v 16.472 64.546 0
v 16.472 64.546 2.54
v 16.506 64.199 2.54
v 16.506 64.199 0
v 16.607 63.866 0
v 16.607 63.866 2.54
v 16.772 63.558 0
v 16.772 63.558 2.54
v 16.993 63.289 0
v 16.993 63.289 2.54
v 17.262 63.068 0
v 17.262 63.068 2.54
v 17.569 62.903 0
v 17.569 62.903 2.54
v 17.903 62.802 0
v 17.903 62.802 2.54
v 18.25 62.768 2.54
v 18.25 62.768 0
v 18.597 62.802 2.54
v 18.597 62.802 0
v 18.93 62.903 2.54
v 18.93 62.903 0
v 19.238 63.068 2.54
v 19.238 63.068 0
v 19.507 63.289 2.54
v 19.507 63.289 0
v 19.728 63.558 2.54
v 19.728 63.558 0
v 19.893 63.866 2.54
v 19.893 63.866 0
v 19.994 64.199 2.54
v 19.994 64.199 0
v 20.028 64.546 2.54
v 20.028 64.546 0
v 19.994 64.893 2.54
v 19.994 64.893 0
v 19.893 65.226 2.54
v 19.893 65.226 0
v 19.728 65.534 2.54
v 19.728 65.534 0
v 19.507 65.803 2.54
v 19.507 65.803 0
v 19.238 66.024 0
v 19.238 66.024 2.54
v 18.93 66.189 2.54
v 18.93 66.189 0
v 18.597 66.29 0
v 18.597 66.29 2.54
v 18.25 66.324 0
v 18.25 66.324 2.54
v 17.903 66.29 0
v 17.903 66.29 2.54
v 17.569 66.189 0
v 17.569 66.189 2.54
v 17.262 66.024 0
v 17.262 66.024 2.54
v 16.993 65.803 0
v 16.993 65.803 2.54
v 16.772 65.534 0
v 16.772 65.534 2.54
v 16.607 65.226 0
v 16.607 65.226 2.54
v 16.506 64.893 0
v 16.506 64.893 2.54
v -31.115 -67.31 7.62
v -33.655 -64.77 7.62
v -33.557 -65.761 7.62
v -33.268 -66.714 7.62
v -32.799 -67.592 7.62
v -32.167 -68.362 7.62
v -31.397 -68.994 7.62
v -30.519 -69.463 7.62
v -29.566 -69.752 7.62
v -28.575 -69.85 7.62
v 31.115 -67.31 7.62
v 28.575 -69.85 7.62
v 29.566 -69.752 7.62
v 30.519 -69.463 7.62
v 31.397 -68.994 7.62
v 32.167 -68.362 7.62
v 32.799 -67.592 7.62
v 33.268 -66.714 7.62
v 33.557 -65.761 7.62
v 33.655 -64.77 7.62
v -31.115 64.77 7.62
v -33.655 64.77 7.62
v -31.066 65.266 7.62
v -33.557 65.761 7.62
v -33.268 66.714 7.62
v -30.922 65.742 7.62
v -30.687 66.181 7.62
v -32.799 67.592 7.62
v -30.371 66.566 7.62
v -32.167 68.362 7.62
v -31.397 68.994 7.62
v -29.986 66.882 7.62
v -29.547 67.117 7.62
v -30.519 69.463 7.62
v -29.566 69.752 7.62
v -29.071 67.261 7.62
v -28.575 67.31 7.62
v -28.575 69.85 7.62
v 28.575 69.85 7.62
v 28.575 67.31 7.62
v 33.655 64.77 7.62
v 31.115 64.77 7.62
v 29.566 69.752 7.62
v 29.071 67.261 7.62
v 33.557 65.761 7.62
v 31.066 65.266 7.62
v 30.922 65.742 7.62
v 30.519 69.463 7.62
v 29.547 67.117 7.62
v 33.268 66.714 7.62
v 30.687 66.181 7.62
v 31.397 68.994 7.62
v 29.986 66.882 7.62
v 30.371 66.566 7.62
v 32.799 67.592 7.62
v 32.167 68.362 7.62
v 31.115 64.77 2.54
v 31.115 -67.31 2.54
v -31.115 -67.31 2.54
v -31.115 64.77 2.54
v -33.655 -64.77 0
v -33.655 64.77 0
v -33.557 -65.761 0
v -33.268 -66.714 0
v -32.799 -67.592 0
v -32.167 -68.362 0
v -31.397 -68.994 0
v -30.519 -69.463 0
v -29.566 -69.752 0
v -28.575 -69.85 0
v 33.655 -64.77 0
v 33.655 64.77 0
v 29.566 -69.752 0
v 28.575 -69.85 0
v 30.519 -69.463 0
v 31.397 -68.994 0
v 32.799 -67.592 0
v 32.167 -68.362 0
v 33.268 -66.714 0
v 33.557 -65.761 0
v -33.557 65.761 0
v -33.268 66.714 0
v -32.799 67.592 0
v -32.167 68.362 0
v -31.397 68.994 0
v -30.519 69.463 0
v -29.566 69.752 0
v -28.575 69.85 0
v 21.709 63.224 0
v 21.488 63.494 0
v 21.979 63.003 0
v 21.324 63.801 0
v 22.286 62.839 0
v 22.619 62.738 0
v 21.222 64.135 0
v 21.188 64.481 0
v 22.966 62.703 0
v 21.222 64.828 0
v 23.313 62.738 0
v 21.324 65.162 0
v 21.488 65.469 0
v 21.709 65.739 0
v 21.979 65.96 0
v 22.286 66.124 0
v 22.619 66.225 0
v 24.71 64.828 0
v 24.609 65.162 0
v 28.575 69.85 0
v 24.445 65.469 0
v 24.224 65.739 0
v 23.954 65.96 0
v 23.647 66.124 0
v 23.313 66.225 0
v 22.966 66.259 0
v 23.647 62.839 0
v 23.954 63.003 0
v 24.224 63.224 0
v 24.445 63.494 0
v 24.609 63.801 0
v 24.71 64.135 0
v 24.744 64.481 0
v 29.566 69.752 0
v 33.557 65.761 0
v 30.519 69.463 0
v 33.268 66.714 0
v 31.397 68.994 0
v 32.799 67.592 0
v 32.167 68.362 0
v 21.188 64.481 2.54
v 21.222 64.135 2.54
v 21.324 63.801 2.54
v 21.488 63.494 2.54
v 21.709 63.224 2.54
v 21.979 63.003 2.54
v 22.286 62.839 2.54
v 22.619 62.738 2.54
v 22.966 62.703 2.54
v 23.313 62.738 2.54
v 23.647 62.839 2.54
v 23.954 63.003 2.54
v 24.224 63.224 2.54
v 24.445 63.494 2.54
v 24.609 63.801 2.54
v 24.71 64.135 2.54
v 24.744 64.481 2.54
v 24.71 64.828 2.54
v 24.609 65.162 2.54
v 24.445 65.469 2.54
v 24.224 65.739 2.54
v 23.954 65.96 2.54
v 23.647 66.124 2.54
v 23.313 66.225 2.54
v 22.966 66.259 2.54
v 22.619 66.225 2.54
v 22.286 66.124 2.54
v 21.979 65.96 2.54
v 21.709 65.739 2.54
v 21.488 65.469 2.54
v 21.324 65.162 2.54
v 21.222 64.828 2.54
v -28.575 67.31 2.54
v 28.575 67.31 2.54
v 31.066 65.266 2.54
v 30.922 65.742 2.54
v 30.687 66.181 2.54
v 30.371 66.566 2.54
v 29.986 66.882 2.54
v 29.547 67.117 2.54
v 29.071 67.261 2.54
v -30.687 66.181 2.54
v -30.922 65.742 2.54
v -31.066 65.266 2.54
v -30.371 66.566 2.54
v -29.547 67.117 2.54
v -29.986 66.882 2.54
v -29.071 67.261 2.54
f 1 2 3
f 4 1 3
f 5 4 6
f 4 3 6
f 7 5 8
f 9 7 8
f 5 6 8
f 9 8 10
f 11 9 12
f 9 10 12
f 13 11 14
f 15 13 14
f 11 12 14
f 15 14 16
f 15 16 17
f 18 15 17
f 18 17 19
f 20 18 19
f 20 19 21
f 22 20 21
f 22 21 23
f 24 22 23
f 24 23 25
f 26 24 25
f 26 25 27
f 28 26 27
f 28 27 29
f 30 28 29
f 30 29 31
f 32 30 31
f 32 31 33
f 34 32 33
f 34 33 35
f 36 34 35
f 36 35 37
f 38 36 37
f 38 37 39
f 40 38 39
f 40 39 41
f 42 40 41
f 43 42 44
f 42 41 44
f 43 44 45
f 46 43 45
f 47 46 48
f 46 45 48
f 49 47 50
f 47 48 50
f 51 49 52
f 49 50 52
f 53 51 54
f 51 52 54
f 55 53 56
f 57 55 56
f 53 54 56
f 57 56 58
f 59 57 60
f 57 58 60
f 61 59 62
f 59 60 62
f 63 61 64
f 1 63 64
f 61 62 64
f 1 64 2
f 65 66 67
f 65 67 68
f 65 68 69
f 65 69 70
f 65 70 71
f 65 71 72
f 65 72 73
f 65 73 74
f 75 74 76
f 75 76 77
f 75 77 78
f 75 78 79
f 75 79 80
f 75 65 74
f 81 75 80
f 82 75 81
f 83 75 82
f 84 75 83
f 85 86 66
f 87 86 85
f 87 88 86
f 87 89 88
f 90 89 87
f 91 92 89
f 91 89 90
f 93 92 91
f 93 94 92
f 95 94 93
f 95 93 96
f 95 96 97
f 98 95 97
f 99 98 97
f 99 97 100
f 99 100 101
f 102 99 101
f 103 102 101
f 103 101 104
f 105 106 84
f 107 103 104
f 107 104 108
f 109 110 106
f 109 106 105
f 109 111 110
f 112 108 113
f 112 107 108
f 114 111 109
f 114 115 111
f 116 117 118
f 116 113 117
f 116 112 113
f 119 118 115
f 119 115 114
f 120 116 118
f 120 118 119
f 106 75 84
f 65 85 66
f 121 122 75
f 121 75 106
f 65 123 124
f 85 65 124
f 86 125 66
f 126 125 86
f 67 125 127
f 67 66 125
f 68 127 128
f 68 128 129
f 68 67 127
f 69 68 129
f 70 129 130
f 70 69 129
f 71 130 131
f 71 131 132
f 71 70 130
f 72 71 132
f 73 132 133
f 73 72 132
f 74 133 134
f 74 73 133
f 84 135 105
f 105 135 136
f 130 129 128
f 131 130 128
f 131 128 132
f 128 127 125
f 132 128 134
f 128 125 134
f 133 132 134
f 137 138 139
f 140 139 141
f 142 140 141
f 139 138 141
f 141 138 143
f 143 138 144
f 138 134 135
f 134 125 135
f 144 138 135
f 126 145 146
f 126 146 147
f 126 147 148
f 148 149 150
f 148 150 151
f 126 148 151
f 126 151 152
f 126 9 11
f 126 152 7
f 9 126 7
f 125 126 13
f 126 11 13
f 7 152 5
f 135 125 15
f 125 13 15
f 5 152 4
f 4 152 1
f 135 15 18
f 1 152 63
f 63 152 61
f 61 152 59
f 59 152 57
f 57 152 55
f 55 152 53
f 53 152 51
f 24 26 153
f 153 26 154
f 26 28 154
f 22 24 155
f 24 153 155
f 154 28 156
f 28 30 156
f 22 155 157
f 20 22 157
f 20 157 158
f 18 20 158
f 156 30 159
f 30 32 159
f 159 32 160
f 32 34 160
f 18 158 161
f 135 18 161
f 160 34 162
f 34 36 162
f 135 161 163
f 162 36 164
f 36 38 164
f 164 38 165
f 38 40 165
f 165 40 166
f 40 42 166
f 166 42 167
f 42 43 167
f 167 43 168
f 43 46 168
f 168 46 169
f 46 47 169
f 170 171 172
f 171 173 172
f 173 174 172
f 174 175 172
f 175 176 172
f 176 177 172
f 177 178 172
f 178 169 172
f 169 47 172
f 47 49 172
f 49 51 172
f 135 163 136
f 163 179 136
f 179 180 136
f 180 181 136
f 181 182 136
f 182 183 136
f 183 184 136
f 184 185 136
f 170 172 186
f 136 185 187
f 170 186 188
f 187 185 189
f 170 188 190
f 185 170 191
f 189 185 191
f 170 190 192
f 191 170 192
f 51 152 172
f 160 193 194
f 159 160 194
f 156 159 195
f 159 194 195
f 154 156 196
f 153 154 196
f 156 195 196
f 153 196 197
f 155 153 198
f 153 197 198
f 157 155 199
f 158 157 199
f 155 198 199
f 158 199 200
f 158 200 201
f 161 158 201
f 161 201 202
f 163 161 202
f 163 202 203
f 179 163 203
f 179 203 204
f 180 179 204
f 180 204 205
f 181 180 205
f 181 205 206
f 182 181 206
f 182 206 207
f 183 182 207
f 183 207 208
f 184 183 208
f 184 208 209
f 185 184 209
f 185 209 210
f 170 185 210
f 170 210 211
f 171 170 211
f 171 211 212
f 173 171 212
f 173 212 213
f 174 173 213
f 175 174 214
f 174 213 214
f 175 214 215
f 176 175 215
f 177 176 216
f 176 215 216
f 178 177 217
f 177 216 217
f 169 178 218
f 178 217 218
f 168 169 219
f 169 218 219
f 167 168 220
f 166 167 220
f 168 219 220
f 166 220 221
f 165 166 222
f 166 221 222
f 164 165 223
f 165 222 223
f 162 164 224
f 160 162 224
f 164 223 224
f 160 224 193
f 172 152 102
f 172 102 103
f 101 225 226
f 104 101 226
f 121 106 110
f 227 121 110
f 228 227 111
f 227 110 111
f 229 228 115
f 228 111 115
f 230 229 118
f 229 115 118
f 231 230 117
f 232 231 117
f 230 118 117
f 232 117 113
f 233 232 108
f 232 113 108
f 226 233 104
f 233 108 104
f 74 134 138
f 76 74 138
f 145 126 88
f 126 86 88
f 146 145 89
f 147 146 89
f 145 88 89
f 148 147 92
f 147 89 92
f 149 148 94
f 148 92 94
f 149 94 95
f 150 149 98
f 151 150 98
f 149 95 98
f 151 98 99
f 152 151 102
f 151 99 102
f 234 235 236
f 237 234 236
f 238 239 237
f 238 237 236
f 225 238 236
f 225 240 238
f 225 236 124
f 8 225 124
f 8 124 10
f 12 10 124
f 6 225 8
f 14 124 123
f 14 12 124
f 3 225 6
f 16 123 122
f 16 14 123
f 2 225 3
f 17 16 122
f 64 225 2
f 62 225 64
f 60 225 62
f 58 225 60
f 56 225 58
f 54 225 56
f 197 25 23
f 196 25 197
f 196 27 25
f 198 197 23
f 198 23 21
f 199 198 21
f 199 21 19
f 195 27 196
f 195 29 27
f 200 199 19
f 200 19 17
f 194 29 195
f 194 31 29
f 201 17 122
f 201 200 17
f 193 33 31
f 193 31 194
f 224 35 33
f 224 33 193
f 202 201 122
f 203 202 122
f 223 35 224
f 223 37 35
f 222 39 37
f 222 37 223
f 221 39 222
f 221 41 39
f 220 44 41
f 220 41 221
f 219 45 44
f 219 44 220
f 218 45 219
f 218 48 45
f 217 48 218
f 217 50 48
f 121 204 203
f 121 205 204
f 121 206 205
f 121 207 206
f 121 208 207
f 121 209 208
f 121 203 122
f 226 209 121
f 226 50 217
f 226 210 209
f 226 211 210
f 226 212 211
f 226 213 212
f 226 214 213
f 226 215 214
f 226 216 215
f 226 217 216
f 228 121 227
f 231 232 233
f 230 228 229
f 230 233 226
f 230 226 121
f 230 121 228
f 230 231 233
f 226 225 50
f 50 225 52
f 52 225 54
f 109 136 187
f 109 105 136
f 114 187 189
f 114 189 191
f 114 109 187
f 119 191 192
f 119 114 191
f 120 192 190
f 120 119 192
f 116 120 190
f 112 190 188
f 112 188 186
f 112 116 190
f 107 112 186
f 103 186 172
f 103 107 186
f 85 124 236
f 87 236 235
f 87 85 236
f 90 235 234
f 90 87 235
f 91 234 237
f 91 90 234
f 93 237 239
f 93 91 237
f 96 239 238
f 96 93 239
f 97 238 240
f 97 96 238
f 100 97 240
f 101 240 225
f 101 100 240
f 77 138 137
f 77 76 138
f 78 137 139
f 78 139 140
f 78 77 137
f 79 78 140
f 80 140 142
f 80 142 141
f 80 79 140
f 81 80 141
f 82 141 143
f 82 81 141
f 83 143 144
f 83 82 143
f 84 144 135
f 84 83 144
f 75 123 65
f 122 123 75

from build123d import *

# Parameters (mm, degrees)
F0_W     = 67.31
F0_H     = 139.7
F1_DEPTH = 7.62
F2_R     = 5.08
F3_T     = -2.54
F4_R     = 5.08
F6_R     = 5.08
F7_D     = 3.556
F8_D     = 3.556


with BuildPart() as f1:
    # F0 (on Top) → F1 (new body)
    with BuildSketch(Plane.XY):
        Rectangle(F0_W, F0_H)
    extrude(amount=F1_DEPTH)

    # F2
    f2_edges = [f1.edges().sort_by_distance(p)[0] for p in [
        (33.655, 69.85, 3.81),
        (-33.655, 69.85, 3.81),
    ]]
    fillet(f2_edges, radius=F2_R)

    # F3
    f3_openings = [f1.faces().sort_by_distance(p)[0] for p in [
        (0, -0.081036, 7.62),
    ]]
    offset(amount=F3_T, openings=f3_openings)

    # F4
    f4_edges = [f1.edges().sort_by_distance(p)[0] for p in [
        (-33.655, -69.85, 3.81),
    ]]
    fillet(f4_edges, radius=F4_R)

    # F6
    f6_edges = [f1.edges().sort_by_distance(p)[0] for p in [
        (33.655, -69.85, 3.81),
    ]]
    fillet(f6_edges, radius=F6_R)

    # F7 (through all)
    with Locations(Plane(origin=(0, 0, 0), x_dir=(1, 0, 0), z_dir=(0, 0, -1))):
        with Locations((18.2498693466, -64.5460113883)):
            Hole(F7_D / 2)

    # F8 (through all)
    with Locations(Plane(origin=(0, 0, 0), x_dir=(1, 0, 0), z_dir=(0, 0, -1))):
        with Locations((22.9663196951, -64.4813999534)):
            Hole(F8_D / 2)


solid = f1.part
